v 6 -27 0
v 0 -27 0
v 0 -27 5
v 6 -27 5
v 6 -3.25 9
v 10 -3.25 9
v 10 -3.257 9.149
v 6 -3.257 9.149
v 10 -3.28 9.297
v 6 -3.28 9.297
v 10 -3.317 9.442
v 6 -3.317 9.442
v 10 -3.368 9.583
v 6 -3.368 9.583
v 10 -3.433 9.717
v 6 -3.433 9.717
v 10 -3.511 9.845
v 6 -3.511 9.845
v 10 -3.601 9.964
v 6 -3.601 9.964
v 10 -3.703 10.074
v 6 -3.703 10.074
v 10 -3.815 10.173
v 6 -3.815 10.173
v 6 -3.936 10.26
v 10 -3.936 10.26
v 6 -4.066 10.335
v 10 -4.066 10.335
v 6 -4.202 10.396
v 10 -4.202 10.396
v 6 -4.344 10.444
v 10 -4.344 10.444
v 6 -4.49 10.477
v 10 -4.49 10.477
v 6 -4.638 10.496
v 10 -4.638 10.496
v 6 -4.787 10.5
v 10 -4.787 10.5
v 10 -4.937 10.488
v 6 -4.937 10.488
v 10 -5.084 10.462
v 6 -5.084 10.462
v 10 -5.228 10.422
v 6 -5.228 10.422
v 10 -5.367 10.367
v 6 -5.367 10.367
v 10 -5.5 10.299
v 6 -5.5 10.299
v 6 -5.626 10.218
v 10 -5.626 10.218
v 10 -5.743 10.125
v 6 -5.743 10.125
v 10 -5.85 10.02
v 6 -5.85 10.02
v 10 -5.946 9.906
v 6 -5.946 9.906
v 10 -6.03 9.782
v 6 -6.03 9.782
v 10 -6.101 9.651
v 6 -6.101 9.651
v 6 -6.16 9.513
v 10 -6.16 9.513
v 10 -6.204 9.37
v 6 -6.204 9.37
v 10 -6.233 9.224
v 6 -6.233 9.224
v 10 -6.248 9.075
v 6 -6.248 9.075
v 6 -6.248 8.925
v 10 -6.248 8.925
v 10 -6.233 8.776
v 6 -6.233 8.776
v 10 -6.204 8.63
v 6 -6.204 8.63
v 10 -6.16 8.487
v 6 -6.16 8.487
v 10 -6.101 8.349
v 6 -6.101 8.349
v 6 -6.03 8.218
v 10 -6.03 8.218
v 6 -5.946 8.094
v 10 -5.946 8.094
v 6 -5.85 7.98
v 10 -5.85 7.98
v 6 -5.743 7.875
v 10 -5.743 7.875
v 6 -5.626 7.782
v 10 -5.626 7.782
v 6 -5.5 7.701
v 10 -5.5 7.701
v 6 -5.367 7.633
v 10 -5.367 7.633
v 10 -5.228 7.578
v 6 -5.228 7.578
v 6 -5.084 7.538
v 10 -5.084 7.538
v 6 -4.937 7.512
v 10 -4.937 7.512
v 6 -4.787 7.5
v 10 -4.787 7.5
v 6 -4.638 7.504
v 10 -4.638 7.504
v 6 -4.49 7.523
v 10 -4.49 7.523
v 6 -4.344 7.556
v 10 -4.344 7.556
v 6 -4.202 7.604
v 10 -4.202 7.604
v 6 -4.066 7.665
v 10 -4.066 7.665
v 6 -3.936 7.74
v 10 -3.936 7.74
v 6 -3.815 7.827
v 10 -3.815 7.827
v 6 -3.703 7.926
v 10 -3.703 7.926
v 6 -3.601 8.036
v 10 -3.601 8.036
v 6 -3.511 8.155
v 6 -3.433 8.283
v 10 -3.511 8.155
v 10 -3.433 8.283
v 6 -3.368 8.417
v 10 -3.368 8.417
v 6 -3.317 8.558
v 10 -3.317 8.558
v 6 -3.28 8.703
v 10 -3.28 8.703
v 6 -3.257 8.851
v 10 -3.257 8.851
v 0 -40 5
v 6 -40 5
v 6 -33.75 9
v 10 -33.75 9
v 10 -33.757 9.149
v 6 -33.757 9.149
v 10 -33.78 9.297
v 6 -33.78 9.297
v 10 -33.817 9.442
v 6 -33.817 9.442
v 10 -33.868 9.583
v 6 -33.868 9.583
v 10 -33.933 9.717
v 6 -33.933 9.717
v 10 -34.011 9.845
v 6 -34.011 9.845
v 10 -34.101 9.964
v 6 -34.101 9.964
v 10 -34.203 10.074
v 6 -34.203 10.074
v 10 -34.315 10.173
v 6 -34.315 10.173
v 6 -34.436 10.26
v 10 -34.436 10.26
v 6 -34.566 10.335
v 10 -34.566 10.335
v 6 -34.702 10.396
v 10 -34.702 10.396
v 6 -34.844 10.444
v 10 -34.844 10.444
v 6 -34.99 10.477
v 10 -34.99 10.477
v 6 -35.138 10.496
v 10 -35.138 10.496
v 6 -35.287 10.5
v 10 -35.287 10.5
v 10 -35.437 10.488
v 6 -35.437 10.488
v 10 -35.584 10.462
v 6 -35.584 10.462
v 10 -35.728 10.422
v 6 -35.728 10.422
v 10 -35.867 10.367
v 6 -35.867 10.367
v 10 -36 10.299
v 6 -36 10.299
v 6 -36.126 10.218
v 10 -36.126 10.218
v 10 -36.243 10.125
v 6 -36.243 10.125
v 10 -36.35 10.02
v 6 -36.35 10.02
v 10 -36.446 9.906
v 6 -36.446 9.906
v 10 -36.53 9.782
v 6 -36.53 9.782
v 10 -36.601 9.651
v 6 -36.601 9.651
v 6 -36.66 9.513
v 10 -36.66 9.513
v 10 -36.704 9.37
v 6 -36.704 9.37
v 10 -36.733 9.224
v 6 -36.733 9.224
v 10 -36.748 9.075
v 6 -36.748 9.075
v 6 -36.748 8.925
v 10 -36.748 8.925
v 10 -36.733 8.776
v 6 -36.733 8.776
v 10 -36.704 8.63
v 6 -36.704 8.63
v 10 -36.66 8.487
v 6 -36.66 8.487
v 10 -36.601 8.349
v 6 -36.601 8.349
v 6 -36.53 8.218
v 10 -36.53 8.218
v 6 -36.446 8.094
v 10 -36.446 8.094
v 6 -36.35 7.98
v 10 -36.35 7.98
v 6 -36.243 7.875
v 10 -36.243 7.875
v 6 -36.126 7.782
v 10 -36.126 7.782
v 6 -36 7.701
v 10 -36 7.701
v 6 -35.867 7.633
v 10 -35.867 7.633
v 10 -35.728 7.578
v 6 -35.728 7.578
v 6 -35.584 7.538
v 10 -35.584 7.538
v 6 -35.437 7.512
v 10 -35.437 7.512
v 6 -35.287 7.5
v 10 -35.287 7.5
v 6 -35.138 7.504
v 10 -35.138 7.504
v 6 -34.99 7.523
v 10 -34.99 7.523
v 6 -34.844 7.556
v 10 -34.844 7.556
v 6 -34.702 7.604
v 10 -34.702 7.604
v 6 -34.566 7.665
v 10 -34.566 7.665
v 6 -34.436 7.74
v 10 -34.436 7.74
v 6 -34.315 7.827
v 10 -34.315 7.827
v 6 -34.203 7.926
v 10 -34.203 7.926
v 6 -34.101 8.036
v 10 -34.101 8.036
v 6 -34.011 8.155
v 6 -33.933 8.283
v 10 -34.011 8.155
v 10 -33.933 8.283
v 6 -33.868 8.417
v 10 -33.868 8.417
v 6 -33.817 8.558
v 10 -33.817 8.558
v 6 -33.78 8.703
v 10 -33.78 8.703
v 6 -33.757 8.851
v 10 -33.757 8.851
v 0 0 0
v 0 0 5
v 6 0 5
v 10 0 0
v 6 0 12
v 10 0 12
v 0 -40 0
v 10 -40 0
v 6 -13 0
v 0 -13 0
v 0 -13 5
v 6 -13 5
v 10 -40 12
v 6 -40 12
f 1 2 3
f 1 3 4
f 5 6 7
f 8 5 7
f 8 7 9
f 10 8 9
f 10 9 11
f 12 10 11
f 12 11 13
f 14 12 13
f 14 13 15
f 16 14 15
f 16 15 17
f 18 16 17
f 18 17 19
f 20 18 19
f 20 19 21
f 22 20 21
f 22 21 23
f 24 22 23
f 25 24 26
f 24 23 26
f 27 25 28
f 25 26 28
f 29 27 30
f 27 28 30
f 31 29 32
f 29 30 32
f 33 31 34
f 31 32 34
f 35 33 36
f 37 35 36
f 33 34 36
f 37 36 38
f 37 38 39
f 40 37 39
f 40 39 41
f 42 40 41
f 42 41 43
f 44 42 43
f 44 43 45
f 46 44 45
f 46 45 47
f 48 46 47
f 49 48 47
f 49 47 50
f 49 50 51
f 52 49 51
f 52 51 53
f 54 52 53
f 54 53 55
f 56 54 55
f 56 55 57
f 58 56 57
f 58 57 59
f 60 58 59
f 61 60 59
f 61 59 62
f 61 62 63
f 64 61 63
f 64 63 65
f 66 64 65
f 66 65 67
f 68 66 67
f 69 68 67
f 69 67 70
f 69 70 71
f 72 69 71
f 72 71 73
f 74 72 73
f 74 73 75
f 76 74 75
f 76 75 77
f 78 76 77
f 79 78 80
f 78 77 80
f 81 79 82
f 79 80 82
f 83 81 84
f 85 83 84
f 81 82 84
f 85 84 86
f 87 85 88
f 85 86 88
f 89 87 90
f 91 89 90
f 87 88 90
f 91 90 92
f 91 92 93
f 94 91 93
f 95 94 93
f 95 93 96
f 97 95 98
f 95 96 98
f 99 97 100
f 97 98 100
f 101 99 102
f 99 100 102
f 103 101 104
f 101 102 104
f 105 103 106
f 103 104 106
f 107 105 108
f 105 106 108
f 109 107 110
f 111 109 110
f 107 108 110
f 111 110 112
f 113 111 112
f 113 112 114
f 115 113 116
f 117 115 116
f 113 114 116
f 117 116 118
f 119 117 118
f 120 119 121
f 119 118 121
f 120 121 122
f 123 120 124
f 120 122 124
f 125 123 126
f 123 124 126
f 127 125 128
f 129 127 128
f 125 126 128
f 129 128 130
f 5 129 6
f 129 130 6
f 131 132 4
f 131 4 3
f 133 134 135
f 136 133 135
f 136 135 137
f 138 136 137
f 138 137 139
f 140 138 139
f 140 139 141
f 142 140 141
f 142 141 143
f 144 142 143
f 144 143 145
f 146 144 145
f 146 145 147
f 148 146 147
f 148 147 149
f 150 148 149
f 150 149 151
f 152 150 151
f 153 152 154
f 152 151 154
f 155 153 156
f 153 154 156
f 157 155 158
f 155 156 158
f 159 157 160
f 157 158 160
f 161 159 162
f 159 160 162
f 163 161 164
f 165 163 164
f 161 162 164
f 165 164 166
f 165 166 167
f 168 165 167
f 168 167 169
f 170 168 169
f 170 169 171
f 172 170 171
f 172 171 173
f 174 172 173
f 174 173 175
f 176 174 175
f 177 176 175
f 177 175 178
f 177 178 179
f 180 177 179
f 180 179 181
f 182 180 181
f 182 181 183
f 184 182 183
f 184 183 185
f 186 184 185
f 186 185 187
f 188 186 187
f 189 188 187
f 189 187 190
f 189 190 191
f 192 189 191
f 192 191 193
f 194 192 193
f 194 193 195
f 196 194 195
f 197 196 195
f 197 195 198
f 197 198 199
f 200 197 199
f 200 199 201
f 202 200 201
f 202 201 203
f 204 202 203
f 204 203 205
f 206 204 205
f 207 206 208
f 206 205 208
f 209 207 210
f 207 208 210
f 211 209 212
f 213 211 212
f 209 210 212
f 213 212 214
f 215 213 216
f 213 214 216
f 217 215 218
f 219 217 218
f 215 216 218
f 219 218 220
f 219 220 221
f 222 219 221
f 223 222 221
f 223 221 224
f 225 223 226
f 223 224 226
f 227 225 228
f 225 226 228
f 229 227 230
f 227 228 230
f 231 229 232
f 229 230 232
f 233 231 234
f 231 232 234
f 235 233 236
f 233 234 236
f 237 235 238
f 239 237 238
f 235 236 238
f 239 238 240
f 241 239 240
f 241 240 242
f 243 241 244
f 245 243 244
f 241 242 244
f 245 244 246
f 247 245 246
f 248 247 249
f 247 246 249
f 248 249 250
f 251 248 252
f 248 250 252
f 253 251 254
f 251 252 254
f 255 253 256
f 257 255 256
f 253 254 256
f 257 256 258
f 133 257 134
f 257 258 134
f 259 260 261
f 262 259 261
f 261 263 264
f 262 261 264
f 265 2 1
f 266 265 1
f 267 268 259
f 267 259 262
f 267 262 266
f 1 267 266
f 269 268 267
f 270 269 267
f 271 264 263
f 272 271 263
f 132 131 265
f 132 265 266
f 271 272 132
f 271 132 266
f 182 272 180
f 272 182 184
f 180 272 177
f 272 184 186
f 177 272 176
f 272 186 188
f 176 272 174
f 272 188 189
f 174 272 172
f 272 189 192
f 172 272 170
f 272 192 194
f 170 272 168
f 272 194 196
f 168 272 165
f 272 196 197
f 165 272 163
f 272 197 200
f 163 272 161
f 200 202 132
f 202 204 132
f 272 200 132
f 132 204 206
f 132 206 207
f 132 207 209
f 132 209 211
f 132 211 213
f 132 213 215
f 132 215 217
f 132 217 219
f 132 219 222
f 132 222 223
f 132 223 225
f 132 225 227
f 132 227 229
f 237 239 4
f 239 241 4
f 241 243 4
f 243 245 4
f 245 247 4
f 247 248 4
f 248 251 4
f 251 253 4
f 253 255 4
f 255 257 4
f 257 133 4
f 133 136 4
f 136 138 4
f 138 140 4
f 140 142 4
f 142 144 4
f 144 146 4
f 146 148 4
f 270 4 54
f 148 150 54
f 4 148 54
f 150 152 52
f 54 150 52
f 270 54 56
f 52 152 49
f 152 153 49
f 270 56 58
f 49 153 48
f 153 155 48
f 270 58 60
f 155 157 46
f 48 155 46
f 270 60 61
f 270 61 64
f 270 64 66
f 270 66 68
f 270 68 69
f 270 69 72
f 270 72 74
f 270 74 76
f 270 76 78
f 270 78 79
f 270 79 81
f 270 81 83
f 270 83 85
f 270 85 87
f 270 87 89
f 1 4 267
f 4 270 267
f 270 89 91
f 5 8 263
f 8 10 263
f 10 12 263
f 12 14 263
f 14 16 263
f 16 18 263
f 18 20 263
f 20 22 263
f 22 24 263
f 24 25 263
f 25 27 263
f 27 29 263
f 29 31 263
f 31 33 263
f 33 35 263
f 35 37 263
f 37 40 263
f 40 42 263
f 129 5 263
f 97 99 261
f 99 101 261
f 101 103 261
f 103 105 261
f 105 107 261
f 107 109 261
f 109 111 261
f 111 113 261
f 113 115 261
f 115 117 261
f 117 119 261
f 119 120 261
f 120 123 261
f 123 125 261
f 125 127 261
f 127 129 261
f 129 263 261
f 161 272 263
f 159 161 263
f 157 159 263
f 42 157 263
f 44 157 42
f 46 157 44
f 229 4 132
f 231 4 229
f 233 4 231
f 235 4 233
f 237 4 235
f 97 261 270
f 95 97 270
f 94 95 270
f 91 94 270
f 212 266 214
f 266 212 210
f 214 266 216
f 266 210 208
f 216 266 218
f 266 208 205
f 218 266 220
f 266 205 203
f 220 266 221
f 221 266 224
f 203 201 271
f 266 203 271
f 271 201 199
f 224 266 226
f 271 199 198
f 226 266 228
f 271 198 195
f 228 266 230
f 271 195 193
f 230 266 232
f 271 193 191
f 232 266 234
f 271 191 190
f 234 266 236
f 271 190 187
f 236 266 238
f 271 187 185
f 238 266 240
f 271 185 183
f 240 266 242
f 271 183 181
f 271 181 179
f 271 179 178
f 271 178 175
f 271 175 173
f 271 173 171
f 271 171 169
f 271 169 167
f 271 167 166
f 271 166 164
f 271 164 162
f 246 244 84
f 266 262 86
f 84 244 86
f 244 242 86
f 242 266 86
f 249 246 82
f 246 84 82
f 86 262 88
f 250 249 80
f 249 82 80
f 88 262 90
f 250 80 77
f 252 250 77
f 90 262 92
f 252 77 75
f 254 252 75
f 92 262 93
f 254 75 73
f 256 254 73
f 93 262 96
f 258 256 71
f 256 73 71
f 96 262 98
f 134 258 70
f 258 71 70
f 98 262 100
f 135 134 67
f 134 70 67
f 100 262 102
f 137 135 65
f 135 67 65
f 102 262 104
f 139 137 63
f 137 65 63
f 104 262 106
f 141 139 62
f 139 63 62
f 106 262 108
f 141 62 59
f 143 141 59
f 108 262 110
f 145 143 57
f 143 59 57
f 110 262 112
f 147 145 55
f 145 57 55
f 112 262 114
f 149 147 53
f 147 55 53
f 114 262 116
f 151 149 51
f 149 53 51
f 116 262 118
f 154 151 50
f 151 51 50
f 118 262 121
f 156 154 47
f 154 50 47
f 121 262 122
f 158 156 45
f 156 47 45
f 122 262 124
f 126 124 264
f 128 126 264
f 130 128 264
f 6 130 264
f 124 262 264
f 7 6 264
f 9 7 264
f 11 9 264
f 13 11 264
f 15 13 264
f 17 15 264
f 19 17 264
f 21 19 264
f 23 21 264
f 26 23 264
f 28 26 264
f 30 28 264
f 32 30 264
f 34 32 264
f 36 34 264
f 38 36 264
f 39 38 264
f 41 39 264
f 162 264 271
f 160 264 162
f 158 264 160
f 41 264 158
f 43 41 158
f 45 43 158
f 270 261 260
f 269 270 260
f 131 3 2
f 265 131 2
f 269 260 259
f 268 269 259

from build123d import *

# Parameters (mm, degrees)
F1_DEPTH = 40
F3_D     = 3
F4_W     = 6
F4_H     = 14
F5_DEPTH = 25


with BuildPart() as f1:
    # F0 (on Front) → F1 (new body)
    with BuildSketch(Plane.XZ):
        Polygon((0, 5), (0, 0), (10, 0), (10, 12), (6, 12), (6, 5), align=None)
    extrude(amount=F1_DEPTH)

    # F3 (through all)
    with Locations(Plane(origin=(6, 0, 0), x_dir=(0, -1, 0), z_dir=(-1, 0, 0))):
        with Locations((35.25, 9), (4.75, 9)):
            Hole(F3_D / 2)

    # F4 (on face) → F5 (cut)
    with BuildSketch(Plane(origin=(0, 0, 0), x_dir=(1, 0, 0), z_dir=(0, 0, -1))):
        with Locations((3, 20)):
            Rectangle(F4_W, F4_H)
    extrude(amount=-F5_DEPTH, mode=Mode.SUBTRACT)


solid = f1.part
